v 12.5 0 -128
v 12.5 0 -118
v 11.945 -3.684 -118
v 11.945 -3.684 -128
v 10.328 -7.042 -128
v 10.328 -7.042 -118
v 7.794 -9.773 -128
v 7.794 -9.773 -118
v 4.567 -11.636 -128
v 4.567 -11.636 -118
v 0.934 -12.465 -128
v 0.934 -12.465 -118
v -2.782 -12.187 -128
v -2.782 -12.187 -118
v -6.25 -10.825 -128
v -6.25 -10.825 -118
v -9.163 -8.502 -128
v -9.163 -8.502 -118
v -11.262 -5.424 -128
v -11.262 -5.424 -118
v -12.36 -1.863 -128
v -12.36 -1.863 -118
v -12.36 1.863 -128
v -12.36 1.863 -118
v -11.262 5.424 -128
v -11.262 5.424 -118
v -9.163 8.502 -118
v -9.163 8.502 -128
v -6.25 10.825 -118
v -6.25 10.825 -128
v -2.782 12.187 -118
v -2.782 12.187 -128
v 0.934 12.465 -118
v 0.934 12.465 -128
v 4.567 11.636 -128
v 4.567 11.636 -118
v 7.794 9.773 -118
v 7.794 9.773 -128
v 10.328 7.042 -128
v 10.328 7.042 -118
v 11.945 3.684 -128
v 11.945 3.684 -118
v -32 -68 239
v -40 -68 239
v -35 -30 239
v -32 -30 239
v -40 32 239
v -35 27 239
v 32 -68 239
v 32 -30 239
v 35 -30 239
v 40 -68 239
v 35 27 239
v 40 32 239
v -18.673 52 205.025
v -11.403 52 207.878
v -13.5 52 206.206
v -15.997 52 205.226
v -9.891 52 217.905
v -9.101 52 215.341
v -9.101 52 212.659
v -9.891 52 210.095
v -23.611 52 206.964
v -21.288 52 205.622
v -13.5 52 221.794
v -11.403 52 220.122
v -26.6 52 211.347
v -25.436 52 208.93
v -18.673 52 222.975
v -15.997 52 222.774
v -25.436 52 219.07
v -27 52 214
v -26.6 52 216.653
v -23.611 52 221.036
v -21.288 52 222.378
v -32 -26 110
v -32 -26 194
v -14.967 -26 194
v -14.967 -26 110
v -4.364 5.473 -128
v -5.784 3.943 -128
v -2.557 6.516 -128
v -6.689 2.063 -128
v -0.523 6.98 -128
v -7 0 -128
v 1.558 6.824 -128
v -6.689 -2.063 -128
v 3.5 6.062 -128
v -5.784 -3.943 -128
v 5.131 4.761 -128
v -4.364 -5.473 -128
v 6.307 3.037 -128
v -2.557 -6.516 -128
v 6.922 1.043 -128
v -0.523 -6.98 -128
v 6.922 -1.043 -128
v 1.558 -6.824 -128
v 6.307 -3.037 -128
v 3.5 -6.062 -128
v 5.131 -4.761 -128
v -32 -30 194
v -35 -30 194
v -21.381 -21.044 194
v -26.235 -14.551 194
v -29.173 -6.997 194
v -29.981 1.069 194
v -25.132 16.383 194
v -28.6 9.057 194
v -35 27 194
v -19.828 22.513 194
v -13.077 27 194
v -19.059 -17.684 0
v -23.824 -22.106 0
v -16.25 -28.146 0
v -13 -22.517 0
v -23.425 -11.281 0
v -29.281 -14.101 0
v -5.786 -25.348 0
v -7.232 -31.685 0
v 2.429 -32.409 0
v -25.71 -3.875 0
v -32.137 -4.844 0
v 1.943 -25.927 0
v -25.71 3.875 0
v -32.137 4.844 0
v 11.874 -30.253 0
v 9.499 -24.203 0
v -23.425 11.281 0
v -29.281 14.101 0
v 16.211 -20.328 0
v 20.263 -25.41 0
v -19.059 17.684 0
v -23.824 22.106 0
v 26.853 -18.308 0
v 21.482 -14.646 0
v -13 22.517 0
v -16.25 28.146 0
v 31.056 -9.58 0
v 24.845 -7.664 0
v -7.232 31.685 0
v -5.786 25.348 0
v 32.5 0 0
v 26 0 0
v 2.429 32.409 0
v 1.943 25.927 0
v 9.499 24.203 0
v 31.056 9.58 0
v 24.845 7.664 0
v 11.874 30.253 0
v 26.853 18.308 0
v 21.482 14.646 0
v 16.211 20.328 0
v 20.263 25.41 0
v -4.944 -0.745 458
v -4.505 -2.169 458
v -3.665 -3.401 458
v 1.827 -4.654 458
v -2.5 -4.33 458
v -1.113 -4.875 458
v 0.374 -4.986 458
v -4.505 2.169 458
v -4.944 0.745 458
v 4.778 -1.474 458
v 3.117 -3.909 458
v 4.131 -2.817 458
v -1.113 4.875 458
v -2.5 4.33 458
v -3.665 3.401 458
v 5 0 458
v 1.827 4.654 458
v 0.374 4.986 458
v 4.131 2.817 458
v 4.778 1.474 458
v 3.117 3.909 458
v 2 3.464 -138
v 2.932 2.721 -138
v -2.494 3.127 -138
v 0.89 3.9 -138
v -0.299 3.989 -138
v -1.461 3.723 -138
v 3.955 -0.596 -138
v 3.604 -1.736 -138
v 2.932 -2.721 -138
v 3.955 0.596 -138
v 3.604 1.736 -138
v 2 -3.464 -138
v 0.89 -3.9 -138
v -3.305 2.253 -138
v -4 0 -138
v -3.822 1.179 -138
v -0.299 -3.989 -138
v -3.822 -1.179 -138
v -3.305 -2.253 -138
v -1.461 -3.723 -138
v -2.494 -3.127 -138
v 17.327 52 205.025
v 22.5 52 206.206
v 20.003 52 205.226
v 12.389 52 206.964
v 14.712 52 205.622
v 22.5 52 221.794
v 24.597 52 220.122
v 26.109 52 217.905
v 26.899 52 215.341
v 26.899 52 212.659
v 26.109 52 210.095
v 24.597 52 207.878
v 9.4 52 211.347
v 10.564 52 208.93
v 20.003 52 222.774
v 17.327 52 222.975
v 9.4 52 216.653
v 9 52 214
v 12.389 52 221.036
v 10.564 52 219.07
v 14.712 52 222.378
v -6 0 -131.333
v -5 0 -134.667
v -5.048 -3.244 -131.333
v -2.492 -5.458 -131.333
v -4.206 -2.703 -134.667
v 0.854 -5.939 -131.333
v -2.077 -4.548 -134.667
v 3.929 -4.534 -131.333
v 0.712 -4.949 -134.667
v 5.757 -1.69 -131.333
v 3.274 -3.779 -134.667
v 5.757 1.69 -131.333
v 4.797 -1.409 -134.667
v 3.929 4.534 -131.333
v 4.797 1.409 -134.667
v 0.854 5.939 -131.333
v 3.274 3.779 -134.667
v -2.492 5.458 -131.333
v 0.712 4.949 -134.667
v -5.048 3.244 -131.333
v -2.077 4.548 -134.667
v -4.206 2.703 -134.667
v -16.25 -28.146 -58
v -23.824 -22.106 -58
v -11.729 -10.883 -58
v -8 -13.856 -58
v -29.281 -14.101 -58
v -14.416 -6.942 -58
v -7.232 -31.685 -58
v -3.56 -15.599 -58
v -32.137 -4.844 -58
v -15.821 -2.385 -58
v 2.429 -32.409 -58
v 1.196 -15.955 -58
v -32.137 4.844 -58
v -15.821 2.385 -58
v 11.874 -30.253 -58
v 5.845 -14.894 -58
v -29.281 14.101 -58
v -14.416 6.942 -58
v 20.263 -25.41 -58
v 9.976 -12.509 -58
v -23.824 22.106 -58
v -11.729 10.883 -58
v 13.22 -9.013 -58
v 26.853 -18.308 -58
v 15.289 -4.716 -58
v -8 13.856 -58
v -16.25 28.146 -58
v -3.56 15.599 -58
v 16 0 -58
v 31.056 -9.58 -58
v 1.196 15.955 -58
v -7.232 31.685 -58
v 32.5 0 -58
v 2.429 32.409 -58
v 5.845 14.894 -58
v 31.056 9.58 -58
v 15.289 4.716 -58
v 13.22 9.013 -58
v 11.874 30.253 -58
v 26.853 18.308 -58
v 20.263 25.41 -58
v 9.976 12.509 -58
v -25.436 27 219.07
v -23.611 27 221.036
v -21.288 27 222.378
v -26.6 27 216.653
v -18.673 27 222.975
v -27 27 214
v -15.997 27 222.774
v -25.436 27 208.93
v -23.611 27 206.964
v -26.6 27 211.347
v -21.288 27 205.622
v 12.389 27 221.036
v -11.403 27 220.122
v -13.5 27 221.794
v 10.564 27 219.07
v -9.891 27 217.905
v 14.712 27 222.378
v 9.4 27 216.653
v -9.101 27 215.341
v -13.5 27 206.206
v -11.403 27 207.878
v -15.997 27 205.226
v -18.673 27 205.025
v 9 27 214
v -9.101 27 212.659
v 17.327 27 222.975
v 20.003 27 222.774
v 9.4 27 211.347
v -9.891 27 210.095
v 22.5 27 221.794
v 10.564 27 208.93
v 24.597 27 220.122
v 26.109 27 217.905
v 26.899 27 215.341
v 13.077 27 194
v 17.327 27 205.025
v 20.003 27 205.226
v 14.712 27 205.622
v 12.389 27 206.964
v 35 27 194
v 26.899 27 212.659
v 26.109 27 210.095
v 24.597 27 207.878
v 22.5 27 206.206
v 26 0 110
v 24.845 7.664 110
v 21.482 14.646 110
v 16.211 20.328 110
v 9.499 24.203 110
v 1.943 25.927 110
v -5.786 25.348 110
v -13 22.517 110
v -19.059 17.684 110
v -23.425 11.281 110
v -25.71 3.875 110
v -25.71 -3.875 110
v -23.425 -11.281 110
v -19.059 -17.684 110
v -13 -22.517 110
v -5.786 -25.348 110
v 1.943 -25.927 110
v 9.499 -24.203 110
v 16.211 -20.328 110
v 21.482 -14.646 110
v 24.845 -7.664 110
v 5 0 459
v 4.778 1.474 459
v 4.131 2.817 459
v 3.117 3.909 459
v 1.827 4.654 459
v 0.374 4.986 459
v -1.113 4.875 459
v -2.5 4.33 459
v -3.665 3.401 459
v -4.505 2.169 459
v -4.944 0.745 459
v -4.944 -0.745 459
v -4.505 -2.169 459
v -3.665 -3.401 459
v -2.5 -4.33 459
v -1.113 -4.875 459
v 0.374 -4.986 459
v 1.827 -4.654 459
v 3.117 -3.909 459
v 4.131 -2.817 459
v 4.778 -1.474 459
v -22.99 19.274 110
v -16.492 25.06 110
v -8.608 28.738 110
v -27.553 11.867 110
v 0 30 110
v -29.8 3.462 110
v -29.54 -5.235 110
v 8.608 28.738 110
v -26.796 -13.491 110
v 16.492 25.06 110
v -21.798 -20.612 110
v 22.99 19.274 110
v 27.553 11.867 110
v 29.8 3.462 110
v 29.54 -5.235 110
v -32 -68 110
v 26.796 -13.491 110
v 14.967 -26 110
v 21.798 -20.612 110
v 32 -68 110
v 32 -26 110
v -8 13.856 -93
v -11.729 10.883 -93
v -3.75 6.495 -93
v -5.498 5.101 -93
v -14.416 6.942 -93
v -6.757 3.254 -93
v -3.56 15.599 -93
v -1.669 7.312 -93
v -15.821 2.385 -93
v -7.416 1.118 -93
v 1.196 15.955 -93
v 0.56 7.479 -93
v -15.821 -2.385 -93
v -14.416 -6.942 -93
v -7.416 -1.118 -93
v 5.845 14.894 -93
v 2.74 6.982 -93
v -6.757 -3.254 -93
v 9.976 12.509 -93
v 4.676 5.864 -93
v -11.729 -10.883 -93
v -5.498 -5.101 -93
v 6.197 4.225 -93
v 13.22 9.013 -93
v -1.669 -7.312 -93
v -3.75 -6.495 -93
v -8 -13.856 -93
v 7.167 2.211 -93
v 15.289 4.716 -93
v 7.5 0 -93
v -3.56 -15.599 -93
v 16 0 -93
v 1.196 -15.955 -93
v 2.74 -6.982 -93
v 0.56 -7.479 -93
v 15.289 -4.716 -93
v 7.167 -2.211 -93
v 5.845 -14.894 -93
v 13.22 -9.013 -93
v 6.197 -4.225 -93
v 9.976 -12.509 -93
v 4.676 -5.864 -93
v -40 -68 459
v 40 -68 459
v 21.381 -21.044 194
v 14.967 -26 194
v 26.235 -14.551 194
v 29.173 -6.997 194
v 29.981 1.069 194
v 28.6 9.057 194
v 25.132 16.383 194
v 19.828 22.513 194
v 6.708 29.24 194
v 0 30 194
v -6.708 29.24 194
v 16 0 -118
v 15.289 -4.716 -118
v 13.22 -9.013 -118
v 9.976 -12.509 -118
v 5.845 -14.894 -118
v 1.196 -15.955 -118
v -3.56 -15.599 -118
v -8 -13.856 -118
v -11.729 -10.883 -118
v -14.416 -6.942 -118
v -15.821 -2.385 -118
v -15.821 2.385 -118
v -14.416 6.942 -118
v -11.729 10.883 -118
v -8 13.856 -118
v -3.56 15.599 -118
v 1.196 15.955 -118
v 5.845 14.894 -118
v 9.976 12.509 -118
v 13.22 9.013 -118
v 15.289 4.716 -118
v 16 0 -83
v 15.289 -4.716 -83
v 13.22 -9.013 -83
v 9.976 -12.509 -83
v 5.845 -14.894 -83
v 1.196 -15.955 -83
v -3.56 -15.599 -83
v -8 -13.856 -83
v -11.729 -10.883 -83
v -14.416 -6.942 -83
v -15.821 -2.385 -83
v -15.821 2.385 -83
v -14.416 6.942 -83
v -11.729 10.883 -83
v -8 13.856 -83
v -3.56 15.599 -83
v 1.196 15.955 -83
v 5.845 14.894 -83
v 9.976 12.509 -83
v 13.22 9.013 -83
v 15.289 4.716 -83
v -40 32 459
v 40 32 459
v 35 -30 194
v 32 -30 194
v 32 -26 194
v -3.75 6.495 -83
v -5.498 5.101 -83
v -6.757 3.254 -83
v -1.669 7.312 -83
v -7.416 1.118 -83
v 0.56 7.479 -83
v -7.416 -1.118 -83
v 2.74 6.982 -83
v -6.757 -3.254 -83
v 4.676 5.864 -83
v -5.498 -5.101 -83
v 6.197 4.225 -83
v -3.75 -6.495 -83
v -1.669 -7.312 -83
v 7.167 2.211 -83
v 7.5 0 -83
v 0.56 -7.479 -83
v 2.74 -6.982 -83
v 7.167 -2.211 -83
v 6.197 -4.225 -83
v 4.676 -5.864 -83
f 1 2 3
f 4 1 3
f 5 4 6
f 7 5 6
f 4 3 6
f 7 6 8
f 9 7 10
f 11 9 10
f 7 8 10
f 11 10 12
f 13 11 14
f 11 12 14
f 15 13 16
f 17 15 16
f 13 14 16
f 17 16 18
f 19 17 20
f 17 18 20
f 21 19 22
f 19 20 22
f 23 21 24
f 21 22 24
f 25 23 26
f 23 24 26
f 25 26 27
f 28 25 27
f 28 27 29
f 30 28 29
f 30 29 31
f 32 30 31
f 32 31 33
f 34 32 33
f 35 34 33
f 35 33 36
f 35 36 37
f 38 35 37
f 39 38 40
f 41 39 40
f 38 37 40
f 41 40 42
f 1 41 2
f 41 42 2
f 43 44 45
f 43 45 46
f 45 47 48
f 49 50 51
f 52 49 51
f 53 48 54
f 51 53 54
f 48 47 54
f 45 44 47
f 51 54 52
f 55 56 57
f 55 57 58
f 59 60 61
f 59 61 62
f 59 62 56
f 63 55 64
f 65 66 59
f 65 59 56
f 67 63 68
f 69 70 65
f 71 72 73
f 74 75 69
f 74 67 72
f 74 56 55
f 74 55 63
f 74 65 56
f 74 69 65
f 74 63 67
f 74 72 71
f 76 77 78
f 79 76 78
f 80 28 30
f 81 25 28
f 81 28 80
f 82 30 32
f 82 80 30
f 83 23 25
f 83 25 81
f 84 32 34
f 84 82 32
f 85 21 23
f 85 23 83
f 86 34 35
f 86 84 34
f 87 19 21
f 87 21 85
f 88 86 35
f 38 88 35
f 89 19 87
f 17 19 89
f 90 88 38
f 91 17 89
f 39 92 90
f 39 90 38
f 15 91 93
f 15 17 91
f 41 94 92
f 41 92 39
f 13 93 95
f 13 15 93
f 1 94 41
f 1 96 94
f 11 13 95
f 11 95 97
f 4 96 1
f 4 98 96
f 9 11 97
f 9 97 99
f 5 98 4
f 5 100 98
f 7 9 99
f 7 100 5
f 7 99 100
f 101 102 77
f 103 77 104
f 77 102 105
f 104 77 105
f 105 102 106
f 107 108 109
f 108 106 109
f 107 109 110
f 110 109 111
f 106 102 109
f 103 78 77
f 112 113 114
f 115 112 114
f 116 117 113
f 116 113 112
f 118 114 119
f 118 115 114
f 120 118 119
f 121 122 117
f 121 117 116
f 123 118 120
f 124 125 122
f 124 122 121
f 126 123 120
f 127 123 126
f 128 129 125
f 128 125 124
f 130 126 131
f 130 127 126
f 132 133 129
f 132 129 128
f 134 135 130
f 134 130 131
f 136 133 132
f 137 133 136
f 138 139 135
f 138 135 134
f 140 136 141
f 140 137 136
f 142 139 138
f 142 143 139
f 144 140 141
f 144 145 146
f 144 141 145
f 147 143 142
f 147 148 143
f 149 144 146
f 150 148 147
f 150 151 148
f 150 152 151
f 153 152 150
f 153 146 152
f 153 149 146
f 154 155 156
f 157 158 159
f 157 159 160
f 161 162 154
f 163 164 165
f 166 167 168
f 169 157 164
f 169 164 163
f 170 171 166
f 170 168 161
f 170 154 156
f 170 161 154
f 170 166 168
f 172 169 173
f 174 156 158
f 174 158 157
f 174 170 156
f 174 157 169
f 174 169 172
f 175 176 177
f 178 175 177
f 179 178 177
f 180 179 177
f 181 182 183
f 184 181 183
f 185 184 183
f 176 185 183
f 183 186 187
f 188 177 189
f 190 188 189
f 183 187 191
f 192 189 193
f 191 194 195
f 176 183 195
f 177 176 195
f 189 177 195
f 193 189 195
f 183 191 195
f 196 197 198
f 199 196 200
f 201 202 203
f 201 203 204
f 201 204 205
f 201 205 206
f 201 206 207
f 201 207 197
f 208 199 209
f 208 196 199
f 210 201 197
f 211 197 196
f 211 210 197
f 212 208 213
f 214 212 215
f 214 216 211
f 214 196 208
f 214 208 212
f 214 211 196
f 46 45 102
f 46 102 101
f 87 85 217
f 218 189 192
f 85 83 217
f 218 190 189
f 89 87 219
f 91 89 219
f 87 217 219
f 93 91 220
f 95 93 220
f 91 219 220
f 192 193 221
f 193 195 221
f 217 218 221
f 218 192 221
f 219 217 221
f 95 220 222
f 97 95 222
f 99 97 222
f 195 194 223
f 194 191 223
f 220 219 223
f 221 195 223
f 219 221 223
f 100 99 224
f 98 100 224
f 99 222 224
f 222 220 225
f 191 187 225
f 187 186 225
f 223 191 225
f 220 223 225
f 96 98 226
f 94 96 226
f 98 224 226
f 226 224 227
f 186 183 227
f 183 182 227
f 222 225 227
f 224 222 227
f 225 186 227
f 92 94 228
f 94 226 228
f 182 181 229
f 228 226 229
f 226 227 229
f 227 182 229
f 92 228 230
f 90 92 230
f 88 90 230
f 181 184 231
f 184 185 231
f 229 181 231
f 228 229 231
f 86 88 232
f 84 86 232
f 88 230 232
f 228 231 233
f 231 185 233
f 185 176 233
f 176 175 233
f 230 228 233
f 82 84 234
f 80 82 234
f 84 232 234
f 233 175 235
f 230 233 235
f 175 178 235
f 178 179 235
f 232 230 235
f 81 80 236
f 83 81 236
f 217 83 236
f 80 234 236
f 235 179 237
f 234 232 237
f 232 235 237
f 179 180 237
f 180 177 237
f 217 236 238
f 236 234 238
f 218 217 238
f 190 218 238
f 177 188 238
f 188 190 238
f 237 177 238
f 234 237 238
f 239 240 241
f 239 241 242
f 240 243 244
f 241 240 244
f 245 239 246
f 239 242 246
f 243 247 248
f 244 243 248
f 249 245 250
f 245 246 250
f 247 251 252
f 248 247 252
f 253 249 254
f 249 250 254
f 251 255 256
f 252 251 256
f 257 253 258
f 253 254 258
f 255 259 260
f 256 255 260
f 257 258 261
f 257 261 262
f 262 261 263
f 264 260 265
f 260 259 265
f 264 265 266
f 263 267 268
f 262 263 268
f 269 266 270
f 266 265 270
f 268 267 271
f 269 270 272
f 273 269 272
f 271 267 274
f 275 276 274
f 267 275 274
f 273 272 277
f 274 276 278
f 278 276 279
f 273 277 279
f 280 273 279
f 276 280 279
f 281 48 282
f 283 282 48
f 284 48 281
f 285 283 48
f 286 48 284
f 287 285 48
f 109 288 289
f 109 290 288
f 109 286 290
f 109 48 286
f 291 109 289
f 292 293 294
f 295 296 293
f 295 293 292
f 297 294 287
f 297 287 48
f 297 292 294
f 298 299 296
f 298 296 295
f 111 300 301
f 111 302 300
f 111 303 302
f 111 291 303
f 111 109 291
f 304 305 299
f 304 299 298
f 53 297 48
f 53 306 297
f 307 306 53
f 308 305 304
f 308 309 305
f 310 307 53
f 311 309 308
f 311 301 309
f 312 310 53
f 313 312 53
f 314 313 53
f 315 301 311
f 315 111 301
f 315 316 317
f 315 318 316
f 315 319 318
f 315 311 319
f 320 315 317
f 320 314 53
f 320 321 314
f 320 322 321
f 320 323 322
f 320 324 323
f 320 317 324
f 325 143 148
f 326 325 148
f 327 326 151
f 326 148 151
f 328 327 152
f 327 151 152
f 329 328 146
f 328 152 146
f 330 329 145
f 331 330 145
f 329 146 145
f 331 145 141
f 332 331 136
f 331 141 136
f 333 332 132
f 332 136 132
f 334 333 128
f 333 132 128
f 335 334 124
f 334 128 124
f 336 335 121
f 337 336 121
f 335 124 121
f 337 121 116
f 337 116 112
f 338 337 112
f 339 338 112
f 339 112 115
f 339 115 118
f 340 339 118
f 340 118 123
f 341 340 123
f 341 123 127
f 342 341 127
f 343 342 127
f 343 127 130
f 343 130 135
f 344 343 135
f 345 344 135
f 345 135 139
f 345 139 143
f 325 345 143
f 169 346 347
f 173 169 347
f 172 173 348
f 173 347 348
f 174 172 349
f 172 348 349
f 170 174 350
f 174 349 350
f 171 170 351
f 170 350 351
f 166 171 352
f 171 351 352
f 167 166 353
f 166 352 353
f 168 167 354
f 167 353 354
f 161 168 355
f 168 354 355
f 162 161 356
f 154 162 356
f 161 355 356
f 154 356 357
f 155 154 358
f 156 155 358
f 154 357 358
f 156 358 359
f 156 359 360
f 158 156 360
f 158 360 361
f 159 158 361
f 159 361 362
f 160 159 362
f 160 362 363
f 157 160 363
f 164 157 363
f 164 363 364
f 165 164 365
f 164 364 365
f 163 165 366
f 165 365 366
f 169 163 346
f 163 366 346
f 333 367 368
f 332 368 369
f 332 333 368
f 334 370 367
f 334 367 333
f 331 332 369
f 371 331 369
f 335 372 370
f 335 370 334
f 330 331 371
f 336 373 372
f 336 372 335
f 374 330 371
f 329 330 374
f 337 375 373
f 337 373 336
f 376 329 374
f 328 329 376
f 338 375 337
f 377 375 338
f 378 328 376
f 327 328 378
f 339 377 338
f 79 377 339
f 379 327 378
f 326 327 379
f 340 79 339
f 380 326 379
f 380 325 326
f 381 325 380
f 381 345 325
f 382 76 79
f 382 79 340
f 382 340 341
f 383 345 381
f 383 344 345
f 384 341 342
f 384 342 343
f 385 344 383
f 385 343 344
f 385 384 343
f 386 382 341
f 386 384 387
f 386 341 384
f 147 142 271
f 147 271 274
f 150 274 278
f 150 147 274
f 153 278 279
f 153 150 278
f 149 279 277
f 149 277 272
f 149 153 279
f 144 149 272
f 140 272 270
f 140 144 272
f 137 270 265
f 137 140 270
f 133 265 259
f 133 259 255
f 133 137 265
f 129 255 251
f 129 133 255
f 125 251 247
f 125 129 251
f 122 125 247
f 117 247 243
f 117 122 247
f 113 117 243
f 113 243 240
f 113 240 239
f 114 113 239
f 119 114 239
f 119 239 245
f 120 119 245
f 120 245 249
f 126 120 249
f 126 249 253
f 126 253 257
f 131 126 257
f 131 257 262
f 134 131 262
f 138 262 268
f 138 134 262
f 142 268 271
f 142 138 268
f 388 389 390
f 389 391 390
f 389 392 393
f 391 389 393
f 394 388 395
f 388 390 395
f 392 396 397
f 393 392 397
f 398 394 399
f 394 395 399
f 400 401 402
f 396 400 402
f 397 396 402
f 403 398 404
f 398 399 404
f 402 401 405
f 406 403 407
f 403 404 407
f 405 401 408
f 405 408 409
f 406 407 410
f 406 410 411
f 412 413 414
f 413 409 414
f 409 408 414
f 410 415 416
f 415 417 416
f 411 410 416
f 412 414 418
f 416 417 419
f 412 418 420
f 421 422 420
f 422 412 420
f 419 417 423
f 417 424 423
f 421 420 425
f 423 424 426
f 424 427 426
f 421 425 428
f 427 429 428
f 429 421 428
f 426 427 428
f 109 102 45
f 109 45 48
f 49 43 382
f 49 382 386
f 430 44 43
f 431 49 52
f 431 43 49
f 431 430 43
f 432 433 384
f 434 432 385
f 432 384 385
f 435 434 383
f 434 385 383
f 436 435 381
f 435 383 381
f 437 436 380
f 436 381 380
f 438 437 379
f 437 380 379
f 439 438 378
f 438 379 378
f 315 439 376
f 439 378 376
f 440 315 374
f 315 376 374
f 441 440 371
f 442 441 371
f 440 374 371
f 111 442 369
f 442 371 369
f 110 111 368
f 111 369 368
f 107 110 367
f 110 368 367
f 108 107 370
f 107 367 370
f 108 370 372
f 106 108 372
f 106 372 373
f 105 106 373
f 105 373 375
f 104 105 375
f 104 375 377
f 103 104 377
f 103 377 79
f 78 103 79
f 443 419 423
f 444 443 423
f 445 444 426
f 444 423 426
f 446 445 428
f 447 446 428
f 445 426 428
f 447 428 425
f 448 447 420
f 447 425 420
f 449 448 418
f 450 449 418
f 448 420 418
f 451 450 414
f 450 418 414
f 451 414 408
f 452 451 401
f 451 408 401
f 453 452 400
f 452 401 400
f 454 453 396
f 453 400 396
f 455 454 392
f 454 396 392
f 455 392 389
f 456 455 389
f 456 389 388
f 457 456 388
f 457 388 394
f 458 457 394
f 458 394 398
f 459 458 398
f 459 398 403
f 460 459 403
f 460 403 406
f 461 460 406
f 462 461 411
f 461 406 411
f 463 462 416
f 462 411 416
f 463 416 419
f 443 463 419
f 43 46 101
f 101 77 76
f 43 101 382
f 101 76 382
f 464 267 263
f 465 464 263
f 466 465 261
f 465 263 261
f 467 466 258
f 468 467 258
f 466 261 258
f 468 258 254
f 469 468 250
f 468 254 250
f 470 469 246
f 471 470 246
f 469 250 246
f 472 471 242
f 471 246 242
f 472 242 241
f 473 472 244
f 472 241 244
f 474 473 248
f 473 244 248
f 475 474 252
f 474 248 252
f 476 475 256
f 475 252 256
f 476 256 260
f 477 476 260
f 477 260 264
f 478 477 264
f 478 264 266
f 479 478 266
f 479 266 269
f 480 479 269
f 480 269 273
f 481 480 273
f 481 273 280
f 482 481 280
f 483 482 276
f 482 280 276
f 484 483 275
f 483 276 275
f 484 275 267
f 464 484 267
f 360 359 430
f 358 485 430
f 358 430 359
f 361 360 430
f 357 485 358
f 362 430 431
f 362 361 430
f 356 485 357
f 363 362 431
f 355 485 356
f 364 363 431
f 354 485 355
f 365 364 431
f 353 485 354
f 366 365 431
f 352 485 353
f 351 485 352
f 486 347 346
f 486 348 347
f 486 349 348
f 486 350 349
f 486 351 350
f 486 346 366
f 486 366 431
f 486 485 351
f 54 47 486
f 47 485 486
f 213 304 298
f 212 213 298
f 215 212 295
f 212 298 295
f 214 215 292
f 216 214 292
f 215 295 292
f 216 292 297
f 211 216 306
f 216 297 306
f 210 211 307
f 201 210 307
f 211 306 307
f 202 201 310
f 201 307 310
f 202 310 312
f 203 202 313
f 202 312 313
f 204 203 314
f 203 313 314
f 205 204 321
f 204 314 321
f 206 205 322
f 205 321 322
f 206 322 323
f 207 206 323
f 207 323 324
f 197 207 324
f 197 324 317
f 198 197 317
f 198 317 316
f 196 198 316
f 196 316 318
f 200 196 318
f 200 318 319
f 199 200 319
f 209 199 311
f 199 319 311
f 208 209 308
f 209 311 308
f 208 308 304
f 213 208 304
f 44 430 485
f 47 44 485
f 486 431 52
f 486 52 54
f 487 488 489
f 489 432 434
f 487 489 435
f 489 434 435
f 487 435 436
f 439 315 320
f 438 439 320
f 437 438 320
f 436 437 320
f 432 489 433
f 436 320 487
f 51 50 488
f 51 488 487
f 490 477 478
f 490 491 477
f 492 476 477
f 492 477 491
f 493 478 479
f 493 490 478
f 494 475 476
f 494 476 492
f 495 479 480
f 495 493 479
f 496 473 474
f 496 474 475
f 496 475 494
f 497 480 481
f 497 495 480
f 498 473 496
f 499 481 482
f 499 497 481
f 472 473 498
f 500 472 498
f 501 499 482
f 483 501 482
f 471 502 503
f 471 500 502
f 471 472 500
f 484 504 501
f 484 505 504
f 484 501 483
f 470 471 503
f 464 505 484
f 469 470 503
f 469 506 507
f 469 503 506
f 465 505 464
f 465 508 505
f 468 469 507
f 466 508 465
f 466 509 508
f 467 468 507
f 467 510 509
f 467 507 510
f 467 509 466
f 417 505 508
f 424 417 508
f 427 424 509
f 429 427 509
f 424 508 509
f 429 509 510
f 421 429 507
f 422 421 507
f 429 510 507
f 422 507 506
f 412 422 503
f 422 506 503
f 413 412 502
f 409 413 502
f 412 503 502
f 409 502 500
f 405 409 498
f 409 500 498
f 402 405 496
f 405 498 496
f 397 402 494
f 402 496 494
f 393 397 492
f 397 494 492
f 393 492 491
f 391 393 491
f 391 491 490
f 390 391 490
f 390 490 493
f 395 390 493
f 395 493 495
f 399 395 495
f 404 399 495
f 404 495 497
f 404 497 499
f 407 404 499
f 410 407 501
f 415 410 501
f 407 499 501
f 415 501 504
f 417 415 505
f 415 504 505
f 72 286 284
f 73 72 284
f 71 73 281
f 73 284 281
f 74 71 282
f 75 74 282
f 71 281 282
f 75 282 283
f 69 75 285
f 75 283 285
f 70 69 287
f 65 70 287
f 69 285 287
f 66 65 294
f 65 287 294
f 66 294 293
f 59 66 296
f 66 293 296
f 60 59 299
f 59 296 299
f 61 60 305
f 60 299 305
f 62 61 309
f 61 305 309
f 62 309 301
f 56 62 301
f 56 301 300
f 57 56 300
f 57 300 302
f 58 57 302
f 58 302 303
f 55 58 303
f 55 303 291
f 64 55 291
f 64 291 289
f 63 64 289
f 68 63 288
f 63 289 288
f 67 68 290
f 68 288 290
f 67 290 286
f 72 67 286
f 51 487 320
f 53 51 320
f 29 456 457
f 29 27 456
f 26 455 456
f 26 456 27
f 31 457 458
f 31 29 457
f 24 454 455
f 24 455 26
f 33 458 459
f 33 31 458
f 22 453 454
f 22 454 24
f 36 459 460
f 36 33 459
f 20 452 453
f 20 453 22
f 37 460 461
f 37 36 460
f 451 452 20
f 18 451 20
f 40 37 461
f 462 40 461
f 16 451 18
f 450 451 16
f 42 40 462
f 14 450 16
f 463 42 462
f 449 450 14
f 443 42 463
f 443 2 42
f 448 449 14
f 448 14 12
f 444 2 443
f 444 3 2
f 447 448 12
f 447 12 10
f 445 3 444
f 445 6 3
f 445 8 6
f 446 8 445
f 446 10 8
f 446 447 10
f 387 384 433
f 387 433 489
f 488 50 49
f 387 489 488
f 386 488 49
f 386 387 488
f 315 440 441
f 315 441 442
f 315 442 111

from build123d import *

# Parameters (mm, degrees)
F0_R           = 32.5
F1_DEPTH       = 58
F2_R           = 16
F3_DEPTH       = 25
F4_R           = 26
F5_DEPTH       = 110
F6_R           = 30
F7_DEPTH       = 84
F8_W           = 70
F8_H           = 57
F9_DEPTH       = 85
F10_W          = 64
F10_H          = 42
F11_DEPTH      = 169
F12_W          = 80
F12_H          = 100
F13_DEPTH      = 180
F13_DEPTH_BACK = 40
F14_R          = 9
F15_DEPTH      = 25
F16_R          = 7.5
F17_DEPTH      = 10
F18_R          = 16
F19_DEPTH      = 25
F20_R          = 12.5
F21_DEPTH      = 10
F24_R          = 5
F25_DEPTH      = 1


with BuildPart() as f1:
    # F0 (on Top) → F1 (new body)
    with BuildSketch(Plane.XY):
        Circle(F0_R)
    extrude(amount=-F1_DEPTH)

    # F4 (on Top) → F5 (join)
    with BuildSketch(Plane.XY):
        Circle(F4_R)
    extrude(amount=F5_DEPTH)

    # F6 (on face) → F7 (join)
    with BuildSketch(Plane.XY.offset(110)):
        Circle(F6_R)
    extrude(amount=F7_DEPTH)

    # F8 (on face) → F9 (join)
    with BuildSketch(Plane.XY.offset(194)):
        with Locations((0, -1.5)):
            Rectangle(F8_W, F8_H)
    extrude(amount=F9_DEPTH)

    # F10 (on face) → F11 (join, through all)
    with BuildSketch(Plane(origin=(0, 0, 110), x_dir=(1, 0, 0), z_dir=(0, 0, -1))):
        with Locations((0, 47)):
            Rectangle(F10_W, F10_H)
    extrude(amount=-F11_DEPTH)

    # F12 (on face) → F13 (join, two sides)
    with BuildSketch(Plane.XY.offset(279)) as f13_sk:
        with Locations((0, -18)):
            Rectangle(F12_W, F12_H)
    extrude(amount=F13_DEPTH)
    extrude(f13_sk.sketch, amount=-F13_DEPTH_BACK)

    # F14 (on face) → F15 (join)
    with BuildSketch(Plane(origin=(0, 27, 0), x_dir=(-1, 0, 0), z_dir=(0, 1, 0))):
        with Locations((18, 214)):
            Circle(F14_R)
        with Locations((-18, 214)):
            Circle(F14_R)
    extrude(amount=F15_DEPTH)



with BuildPart() as f3:
    # F2 (on face) → F3 (new body)
    with BuildSketch(Plane(origin=(0, 0, -93), x_dir=(1, 0, 0), z_dir=(0, 0, -1))):
        Circle(F2_R)
    extrude(amount=F3_DEPTH)

    # F16 (on face) → F17 (join)
    with BuildSketch(Plane(origin=(0, 0, -83), x_dir=(1, 0, 0), z_dir=(0, 0, -1))):
        Circle(F16_R)
    extrude(amount=F17_DEPTH)


with BuildPart() as f1_1:
    add(f1.part)

    add(f3.part)  # F19 merges F3
    # F18 (on face) → F19 (join)
    with BuildSketch(Plane(origin=(0, 0, -58), x_dir=(1, 0, 0), z_dir=(0, 0, -1))):
        Circle(F18_R)
    extrude(amount=F19_DEPTH)

    # F20 (on face) → F21 (join)
    with BuildSketch(Plane(origin=(0, 0, -118), x_dir=(1, 0, 0), z_dir=(0, 0, -1))):
        Circle(F20_R)
    extrude(amount=F21_DEPTH)

    # F22 (on Front) → F23 (revolve)
    with BuildSketch(Plane.XZ):
        Polygon((0, -138), (0, -128), (-7, -128), (-4, -138), align=None)
    revolve(axis=Axis((0, 0, -93), (0, 0, 1)))

    # F24 (on face) → F25 (cut)
    with BuildSketch(Plane.XY.offset(459)):
        Circle(F24_R)
    extrude(amount=-F25_DEPTH, mode=Mode.SUBTRACT)


solid = f1_1.part
